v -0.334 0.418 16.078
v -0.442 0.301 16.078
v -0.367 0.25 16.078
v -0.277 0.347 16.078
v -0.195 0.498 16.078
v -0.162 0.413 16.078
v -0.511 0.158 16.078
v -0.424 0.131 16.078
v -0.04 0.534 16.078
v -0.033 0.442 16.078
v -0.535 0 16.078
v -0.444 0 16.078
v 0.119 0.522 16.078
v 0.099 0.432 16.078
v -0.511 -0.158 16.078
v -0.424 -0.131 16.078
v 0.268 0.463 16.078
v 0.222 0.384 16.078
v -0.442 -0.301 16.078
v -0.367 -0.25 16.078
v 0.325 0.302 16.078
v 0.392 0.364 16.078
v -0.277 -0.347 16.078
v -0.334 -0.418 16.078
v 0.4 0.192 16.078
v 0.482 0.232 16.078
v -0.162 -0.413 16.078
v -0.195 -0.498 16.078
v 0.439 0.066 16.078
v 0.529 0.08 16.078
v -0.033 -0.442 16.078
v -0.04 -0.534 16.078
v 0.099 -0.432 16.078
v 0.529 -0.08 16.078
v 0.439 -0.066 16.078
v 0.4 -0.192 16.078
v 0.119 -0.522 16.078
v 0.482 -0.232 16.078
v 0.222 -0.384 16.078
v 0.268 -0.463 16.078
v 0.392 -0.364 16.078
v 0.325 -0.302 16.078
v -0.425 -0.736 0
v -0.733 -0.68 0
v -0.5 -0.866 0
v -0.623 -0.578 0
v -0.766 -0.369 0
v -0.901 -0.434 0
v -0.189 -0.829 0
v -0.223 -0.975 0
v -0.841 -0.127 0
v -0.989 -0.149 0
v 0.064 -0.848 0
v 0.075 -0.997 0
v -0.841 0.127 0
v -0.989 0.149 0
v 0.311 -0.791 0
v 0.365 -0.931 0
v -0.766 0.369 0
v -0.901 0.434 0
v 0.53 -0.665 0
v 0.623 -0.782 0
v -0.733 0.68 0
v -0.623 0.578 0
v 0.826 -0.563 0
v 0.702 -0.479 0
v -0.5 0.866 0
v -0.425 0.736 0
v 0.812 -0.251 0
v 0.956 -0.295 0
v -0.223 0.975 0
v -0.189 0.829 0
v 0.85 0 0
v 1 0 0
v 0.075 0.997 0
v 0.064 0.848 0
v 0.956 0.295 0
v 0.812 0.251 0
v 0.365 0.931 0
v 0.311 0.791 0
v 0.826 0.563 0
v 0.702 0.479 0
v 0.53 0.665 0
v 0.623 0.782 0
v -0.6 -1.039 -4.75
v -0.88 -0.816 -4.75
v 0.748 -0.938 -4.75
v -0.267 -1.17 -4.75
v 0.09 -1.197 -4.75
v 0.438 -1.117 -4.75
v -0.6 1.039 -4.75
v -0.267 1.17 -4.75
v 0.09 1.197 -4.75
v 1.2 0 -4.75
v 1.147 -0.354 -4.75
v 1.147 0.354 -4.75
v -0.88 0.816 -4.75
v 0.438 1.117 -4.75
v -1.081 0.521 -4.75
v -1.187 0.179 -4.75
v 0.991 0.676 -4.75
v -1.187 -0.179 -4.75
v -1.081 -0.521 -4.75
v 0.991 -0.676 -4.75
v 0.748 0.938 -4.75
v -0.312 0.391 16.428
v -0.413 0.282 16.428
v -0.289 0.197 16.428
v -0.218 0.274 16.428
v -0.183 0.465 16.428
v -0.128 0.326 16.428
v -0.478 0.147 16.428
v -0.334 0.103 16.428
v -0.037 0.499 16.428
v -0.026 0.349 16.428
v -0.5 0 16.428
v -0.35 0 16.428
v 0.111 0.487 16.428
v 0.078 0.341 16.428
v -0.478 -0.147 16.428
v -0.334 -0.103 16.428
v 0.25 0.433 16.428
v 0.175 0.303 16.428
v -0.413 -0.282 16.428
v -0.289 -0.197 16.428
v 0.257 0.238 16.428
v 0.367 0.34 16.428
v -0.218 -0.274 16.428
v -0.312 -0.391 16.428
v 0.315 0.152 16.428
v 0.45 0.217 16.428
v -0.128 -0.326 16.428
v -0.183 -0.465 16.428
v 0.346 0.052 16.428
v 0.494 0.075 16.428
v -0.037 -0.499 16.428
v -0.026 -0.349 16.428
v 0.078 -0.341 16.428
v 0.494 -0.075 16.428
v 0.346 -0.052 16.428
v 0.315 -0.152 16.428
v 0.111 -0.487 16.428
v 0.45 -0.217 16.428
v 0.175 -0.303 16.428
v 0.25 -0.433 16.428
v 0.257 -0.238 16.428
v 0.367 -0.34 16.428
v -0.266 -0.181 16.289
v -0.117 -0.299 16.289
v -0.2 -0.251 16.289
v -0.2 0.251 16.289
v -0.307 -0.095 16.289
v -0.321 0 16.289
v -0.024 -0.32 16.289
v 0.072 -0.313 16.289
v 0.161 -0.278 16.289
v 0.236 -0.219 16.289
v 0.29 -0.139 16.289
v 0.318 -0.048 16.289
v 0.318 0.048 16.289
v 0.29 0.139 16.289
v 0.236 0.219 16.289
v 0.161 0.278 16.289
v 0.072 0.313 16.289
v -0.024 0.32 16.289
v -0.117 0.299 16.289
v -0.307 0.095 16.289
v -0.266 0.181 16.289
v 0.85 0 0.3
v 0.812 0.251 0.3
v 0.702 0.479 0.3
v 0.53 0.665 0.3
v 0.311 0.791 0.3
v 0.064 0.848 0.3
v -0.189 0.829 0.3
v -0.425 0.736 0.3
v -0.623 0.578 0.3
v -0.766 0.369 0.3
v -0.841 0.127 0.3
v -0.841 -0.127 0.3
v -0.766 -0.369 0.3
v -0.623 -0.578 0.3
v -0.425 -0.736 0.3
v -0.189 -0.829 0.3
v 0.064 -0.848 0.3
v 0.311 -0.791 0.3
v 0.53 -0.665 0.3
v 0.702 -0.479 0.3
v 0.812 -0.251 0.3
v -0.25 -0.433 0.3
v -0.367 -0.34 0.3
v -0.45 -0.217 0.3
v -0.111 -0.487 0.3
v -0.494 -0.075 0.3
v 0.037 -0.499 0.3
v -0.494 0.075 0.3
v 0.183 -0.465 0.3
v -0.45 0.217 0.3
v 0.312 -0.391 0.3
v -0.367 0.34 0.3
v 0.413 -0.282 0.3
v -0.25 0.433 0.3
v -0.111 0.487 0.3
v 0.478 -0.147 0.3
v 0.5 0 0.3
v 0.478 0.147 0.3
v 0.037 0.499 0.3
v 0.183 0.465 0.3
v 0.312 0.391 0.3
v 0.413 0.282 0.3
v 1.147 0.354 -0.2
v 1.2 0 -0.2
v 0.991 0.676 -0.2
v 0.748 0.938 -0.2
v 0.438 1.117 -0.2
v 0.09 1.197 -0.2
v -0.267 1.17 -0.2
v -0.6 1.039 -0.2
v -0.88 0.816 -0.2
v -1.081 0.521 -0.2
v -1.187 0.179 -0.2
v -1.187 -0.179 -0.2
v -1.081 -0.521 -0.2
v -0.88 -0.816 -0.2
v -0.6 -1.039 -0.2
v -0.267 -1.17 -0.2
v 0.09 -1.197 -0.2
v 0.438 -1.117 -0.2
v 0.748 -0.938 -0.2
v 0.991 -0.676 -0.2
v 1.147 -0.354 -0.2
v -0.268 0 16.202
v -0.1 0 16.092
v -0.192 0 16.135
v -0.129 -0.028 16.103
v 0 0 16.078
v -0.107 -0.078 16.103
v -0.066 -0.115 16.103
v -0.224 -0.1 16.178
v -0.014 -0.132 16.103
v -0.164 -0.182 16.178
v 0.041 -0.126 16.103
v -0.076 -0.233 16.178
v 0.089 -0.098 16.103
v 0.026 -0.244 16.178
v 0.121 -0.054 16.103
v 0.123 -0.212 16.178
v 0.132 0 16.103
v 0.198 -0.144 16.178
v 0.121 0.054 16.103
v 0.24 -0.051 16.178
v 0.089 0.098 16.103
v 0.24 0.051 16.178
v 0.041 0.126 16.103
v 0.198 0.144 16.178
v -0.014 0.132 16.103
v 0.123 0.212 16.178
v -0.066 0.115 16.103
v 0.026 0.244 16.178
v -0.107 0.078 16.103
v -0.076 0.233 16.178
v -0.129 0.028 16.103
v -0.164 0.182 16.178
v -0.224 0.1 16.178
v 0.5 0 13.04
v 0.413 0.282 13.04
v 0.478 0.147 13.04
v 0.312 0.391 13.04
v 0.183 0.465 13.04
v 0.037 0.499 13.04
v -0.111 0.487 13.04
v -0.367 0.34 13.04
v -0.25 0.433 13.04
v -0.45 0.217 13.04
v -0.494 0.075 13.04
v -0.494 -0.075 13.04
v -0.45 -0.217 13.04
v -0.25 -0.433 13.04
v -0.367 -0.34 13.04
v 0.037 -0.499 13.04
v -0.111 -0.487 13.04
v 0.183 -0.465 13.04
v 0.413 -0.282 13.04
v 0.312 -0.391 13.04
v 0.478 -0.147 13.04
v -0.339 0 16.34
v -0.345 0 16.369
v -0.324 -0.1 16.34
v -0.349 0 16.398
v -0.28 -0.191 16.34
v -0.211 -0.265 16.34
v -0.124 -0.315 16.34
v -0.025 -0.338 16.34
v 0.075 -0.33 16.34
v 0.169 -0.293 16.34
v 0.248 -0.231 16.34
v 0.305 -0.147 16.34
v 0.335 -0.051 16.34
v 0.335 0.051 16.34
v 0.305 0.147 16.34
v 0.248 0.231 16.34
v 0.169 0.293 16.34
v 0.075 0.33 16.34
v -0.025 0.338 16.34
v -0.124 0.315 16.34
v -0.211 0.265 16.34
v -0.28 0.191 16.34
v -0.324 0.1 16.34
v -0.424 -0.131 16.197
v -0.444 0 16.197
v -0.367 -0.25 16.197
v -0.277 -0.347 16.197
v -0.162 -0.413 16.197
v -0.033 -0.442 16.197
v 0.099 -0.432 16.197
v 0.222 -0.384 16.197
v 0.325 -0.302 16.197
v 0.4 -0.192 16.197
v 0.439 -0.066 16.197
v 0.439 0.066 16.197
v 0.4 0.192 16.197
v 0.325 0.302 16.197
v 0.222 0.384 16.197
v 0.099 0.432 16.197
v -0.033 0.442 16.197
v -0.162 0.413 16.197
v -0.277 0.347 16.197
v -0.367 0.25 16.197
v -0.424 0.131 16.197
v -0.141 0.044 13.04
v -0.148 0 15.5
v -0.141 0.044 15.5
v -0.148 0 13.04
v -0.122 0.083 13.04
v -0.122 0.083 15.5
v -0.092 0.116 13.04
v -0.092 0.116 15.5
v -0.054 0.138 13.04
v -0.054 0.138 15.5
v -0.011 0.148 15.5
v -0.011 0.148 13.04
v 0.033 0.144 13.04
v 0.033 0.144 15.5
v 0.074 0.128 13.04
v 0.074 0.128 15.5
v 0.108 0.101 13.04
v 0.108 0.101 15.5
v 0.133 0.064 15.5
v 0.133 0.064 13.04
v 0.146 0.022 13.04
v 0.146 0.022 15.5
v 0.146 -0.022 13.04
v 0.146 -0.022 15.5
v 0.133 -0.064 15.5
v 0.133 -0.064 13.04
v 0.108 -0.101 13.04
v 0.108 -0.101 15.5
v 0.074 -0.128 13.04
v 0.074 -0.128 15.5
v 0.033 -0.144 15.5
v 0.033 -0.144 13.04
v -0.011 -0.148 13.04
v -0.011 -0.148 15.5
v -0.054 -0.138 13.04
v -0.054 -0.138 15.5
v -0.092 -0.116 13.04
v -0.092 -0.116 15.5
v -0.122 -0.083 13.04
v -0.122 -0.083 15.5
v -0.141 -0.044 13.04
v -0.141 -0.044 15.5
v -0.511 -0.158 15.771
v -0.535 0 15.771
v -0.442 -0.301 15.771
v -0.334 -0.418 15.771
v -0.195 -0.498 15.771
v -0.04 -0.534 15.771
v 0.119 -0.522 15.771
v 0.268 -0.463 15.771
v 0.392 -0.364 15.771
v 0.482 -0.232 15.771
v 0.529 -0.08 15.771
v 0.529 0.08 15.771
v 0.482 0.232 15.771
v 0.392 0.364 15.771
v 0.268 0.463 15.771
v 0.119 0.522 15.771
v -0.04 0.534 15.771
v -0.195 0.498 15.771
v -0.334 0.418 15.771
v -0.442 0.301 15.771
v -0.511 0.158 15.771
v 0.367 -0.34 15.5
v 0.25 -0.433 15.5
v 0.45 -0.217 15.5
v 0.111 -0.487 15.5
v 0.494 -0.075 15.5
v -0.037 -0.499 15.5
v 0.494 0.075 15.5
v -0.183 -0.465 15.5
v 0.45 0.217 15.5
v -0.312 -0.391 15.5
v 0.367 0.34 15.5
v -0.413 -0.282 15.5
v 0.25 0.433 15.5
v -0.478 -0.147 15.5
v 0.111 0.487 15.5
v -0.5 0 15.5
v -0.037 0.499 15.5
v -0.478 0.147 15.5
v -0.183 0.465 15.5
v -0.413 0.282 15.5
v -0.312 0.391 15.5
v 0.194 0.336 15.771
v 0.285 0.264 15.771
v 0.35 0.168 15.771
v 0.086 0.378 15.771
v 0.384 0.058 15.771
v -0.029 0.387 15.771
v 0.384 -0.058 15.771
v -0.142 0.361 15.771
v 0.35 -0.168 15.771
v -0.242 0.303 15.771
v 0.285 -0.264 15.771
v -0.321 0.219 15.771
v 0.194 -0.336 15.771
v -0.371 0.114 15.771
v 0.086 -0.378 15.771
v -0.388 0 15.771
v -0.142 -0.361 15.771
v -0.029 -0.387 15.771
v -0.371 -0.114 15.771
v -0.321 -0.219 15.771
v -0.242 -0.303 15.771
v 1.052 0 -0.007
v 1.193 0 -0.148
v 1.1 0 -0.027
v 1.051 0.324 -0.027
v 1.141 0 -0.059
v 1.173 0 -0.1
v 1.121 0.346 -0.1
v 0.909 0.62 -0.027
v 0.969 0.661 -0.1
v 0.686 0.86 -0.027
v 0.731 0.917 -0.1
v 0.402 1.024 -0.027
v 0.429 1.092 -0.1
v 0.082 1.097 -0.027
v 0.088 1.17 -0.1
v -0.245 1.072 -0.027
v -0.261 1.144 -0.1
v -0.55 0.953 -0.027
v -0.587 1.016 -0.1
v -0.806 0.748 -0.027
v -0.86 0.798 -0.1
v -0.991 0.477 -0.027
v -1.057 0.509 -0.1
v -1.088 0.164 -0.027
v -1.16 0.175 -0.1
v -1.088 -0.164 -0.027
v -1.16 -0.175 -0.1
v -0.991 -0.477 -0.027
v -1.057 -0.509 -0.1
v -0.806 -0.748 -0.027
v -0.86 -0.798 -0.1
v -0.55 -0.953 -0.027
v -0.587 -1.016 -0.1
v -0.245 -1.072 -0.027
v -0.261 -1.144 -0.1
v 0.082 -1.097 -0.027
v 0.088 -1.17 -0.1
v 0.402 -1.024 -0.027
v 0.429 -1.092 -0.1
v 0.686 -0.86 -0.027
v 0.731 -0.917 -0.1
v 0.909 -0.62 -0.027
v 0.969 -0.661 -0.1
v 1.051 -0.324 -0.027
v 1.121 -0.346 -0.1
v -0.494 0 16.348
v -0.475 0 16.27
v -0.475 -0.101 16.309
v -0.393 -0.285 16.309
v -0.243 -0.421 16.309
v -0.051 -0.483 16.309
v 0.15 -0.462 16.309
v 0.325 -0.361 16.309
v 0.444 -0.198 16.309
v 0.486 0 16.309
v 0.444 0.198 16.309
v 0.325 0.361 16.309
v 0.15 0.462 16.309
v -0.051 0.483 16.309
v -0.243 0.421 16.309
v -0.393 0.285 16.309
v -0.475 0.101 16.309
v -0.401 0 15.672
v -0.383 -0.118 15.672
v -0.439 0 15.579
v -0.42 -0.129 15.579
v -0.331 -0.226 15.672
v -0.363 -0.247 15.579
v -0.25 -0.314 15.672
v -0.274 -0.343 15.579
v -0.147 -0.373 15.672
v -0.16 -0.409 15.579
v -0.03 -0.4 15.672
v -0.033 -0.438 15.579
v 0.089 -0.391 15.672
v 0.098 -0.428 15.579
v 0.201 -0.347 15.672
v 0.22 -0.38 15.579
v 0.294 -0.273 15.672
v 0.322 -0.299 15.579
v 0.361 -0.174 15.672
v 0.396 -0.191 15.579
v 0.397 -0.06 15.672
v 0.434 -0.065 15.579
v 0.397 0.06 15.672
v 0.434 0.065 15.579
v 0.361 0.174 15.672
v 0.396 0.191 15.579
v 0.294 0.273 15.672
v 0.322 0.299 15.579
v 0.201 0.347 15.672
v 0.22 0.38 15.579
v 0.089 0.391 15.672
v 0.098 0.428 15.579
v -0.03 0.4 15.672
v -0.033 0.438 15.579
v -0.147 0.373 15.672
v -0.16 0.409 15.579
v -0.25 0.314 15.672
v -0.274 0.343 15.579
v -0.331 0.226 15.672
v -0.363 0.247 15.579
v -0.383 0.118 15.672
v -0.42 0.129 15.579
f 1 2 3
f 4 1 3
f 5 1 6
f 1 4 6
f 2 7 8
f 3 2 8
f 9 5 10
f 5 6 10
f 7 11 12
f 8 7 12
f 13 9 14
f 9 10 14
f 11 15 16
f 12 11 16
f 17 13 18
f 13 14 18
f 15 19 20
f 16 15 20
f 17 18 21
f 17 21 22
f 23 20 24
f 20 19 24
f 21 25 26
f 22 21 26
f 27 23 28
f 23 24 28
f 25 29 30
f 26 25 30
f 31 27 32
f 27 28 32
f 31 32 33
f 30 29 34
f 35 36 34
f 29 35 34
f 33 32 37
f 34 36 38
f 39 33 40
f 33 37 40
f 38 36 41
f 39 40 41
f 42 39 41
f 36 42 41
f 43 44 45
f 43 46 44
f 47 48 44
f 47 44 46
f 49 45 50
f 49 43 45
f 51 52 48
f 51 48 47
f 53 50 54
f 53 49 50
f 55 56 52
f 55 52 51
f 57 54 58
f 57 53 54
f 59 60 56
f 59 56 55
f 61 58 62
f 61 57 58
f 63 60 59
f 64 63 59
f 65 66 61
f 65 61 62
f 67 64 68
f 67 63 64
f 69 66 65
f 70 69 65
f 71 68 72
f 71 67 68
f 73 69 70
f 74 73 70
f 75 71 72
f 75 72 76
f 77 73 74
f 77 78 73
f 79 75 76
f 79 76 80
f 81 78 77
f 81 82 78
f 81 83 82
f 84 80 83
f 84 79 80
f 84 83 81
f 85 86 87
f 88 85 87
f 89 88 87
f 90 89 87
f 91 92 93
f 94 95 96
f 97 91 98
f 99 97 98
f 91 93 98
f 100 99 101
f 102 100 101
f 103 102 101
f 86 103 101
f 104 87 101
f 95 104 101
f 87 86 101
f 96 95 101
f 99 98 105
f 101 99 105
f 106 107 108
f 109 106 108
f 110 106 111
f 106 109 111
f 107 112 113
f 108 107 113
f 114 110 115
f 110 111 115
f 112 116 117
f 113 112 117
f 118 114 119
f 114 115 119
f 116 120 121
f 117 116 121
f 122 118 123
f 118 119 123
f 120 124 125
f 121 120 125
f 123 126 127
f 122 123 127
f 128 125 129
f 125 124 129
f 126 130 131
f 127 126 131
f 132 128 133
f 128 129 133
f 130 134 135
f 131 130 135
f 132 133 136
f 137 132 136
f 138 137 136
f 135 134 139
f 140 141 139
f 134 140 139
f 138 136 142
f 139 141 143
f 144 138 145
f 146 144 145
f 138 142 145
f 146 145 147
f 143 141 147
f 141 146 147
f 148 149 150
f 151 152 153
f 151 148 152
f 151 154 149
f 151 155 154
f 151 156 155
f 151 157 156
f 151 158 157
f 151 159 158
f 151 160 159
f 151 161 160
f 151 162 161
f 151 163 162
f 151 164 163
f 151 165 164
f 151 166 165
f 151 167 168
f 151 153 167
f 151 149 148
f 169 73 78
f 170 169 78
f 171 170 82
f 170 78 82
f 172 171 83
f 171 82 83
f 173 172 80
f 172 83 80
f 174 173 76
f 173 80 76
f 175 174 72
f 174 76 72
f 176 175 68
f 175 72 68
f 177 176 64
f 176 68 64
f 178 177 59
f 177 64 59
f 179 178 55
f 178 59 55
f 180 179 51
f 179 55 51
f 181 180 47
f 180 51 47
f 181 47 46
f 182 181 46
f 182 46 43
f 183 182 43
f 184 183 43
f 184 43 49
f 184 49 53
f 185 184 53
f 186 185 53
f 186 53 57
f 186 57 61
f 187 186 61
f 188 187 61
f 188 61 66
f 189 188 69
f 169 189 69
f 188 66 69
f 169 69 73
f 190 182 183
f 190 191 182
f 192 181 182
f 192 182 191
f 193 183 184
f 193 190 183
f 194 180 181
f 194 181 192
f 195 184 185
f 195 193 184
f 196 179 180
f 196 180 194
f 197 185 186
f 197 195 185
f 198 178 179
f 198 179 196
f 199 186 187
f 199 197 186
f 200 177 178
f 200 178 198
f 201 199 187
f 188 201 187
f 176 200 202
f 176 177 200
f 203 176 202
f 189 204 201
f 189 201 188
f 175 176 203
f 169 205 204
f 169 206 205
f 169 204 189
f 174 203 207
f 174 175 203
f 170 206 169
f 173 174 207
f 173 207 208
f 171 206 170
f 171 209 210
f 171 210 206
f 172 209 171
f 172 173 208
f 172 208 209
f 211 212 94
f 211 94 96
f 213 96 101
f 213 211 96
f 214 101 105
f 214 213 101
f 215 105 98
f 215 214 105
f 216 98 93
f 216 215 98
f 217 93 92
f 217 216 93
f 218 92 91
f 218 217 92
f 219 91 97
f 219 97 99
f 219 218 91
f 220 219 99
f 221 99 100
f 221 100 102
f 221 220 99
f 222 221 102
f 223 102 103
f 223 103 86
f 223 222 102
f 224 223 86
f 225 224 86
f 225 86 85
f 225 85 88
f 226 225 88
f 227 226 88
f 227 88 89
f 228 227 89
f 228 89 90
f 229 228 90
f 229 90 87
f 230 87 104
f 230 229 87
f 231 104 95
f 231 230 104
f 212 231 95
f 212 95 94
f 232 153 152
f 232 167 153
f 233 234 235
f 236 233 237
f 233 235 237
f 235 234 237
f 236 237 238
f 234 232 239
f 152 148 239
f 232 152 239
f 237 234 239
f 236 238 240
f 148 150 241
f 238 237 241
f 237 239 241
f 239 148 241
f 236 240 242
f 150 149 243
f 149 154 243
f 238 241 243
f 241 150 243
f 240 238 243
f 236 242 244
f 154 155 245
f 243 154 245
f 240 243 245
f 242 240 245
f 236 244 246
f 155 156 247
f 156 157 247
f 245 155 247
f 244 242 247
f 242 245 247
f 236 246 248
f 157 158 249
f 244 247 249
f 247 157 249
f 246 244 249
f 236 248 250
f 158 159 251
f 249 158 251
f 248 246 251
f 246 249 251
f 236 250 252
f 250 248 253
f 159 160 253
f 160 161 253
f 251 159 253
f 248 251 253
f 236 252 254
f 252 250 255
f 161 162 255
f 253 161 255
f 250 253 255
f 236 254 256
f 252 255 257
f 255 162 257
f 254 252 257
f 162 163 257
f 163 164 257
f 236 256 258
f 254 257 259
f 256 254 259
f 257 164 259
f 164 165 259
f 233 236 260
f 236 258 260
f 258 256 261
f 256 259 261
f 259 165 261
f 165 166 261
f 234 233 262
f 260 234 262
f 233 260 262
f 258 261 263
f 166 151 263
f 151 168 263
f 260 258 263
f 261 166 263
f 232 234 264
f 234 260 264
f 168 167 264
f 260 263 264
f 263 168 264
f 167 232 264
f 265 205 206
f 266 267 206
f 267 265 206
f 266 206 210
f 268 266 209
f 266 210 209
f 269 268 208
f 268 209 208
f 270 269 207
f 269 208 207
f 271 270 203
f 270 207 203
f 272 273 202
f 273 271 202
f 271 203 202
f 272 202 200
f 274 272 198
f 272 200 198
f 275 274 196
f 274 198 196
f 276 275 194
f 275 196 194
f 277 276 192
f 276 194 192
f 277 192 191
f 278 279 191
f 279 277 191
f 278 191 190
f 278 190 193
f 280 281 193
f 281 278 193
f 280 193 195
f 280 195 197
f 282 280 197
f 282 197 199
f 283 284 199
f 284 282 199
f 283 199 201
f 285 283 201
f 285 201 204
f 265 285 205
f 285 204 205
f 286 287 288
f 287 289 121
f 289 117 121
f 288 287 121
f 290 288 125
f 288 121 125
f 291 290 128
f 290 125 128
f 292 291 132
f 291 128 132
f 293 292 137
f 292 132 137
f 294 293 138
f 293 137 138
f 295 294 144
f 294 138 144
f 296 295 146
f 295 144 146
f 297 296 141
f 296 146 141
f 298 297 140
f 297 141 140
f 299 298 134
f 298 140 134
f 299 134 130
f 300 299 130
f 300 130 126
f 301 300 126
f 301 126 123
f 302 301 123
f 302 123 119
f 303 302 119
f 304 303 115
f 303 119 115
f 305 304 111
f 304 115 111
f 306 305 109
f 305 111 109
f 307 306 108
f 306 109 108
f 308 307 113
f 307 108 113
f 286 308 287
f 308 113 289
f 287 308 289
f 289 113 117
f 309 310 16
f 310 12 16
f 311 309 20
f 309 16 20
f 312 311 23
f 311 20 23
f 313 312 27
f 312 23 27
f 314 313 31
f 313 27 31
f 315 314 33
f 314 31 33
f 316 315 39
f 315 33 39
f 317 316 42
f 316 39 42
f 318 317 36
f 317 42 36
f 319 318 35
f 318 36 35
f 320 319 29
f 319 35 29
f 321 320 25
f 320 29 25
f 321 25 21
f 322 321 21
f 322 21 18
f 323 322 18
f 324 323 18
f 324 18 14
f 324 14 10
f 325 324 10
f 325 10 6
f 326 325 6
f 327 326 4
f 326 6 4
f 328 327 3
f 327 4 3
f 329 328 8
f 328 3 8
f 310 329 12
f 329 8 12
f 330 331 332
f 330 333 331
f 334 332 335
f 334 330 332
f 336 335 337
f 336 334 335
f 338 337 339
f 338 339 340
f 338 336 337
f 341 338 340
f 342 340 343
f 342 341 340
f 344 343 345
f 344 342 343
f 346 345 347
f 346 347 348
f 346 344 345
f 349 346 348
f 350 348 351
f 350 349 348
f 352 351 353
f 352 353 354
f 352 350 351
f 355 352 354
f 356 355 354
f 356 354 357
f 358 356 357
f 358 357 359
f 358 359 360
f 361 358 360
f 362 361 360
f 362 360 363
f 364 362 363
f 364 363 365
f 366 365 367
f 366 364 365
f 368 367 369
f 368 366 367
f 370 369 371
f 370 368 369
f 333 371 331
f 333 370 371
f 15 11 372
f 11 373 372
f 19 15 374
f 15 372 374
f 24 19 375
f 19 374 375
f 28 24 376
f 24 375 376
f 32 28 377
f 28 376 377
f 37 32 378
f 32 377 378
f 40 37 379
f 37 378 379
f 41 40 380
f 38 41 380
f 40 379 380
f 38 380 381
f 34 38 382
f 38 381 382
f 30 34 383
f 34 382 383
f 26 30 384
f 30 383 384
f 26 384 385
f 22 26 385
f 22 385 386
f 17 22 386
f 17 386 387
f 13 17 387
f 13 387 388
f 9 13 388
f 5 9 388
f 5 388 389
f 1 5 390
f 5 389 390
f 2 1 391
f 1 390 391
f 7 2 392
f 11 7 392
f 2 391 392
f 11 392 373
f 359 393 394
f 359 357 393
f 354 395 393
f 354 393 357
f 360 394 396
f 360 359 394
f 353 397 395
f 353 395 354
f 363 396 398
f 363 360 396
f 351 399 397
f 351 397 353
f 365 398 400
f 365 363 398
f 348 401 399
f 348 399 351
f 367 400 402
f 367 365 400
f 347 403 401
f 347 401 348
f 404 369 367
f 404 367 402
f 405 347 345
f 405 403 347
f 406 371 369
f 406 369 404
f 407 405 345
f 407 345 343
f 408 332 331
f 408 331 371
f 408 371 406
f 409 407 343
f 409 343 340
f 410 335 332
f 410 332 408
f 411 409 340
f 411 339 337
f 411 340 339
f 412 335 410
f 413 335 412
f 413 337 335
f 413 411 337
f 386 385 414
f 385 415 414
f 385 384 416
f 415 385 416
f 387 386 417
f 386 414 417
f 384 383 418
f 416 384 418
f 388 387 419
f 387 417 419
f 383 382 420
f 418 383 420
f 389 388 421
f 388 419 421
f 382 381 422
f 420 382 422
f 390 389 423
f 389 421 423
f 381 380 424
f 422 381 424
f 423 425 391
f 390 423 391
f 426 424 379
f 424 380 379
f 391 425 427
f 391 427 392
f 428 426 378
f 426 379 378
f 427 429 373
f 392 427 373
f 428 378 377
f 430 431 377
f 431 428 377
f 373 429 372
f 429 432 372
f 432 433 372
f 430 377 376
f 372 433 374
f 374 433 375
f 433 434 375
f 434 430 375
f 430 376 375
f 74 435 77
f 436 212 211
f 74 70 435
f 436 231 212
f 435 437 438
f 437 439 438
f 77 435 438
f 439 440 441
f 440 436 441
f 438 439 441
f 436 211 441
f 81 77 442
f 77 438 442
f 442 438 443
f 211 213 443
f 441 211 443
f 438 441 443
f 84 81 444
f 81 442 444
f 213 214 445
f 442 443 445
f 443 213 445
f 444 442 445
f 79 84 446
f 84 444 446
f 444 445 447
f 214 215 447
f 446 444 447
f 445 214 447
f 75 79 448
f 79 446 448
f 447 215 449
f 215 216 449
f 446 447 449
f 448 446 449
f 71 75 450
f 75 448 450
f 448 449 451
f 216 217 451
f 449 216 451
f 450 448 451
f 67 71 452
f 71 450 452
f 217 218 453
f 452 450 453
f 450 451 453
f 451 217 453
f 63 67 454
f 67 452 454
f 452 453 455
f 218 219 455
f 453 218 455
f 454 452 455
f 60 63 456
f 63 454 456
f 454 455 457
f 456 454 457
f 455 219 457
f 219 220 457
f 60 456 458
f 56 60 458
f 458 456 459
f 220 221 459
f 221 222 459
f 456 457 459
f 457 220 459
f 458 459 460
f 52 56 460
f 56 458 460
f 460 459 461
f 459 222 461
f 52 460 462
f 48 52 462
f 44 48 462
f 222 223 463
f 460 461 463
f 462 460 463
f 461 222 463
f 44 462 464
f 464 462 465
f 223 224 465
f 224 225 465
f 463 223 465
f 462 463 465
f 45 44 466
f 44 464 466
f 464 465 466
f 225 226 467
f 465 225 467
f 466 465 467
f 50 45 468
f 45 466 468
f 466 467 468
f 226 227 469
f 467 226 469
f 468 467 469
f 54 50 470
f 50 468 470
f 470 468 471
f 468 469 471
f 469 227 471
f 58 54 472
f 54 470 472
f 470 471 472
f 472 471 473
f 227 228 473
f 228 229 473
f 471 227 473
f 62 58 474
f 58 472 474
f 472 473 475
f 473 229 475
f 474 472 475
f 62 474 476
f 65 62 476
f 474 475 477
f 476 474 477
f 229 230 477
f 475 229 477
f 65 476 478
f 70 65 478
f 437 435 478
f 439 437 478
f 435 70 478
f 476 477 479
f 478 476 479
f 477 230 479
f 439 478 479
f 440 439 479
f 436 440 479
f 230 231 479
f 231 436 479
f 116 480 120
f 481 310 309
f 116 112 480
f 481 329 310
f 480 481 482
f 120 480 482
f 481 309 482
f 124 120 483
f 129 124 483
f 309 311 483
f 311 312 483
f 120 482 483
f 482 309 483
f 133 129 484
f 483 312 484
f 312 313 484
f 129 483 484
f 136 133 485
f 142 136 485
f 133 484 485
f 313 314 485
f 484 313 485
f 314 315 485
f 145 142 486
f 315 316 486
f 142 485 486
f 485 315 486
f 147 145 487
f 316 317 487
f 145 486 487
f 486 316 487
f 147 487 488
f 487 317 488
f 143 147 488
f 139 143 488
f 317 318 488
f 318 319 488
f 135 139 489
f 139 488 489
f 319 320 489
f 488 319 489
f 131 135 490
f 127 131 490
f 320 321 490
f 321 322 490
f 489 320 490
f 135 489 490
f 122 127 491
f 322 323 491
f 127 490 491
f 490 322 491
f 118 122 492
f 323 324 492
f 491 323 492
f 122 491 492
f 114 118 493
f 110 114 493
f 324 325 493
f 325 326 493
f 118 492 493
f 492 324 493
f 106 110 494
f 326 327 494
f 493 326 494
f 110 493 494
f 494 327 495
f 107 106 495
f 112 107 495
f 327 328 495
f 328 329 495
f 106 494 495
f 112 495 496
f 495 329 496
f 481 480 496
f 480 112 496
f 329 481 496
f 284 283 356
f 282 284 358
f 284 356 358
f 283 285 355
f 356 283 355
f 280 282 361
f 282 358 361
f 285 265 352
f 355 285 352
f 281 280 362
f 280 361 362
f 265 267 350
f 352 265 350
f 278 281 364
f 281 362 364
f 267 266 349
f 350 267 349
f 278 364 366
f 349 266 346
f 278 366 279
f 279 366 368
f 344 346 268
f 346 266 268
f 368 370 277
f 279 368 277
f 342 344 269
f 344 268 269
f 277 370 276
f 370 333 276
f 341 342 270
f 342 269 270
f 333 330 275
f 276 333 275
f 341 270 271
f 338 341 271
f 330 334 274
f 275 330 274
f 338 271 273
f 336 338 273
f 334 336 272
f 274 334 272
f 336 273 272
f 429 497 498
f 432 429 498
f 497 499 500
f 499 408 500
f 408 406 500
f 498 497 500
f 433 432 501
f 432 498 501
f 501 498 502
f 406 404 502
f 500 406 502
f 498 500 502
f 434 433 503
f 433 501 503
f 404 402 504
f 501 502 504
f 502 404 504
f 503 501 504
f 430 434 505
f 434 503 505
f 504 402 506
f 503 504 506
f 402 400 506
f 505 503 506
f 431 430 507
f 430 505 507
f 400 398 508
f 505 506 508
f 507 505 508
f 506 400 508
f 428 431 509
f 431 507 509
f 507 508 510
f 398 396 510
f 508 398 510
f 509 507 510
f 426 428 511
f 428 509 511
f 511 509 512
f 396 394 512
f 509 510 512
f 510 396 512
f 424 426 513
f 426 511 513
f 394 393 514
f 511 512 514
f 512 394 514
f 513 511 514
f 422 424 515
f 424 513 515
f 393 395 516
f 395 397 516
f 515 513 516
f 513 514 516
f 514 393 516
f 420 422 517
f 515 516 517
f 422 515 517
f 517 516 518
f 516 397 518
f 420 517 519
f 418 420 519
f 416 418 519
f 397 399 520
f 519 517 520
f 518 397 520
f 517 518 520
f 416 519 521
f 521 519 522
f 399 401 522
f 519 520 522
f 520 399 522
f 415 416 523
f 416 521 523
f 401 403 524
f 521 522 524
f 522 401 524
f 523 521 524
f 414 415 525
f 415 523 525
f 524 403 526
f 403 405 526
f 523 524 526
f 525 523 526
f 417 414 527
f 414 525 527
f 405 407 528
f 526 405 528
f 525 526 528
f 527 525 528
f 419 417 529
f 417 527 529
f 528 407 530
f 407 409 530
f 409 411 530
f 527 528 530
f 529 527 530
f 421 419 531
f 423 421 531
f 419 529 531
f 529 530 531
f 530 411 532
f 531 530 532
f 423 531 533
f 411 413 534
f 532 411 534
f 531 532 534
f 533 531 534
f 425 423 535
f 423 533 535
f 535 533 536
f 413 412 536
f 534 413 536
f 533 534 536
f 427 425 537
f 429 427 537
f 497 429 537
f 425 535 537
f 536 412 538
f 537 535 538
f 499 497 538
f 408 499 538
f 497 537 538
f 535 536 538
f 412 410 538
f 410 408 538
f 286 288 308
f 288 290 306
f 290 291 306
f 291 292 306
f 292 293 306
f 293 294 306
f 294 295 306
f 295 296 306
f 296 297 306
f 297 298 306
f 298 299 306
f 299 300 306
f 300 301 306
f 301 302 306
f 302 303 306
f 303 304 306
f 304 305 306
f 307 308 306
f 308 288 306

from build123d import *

# Parameters (mm, degrees)
SKETCH1_R           = 0.5
BOSS_EXTRUDE2_DEPTH = 15.5
SKETCH1_3_R         = 1.2
BOSS_EXTRUDE3_DEPTH = 4.75
FILLET1_R           = 0.2
SKETCH2_R           = 0.85
BOSS_EXTRUDE4_DEPTH = 0.3
SKETCH4_W           = 0.452177067
SKETCH4_H           = 0.051188015
SKETCH5_W           = 2.336260119
SKETCH5_H           = 2.46


with BuildPart() as part:
    # Sketch1 → Boss-Extrude2 (new body)
    with BuildSketch(Plane.XY):
        Circle(SKETCH1_R)
    extrude(amount=BOSS_EXTRUDE2_DEPTH)



with BuildPart() as body_2:
    # Sketch1<3> → Boss-Extrude3 (new body)
    with BuildSketch(Plane.XY):
        Circle(SKETCH1_3_R)
    extrude(amount=-BOSS_EXTRUDE3_DEPTH)

    # Fillet1
    fillet1_edges = [body_2.edges().sort_by_distance(p)[0] for p in [
        (-1.2, 0, 0),
    ]]
    fillet(fillet1_edges, radius=FILLET1_R)


with BuildPart() as part_1:
    add(part.part)

    add(body_2.part)  # Boss-Extrude4 merges body 2
    # Sketch2 → Boss-Extrude4 (add)
    with BuildSketch(Plane.XY):
        Circle(SKETCH2_R)
    extrude(amount=BOSS_EXTRUDE4_DEPTH)

    # Sketch3 → Revolve1 (revolve)
    with BuildSketch(Plane(origin=(0, 0, 0), x_dir=(1, 0, 0), z_dir=(0, 1, 0))):
        with BuildLine():
            Line((0.5, -15.5), (0, -15.5))
            Line((0, -15.5), (0, -16.0775))
            ThreePointArc((0, -16.0775), (0.247487373, -16.180012627), (0.35, -16.4275))
            Line((0.35, -16.4275), (0.5, -16.4275))
            ThreePointArc((0.5, -16.4275), (0.485692665, -16.308745486), (0.443589461, -16.196787213))
            Line((0.443589461, -16.196787213), (0.443589461, -16.0775))
            Line((0.443589461, -16.0775), (0.535097449, -16.0775))
            Line((0.535097449, -16.0775), (0.535097449, -15.770986484))
            Line((0.535097449, -15.770986484), (0.388145342, -15.770986484))
            ThreePointArc((0.388145342, -15.770986484), (0.417208297, -15.624404477), (0.5, -15.5))
        make_face()
    revolve(axis=Axis((0, 0, 15.5), (0, 0, 1)))

    # Sketch4 → Revolve2 (revolve)
    with BuildSketch(Plane(origin=(0, 0, 0), x_dir=(1, 0, 0), z_dir=(0, 1, 0))):
        with Locations((-0.226088534, -16.314405992)):
            Rectangle(SKETCH4_W, SKETCH4_H)
    revolve(axis=Axis((0, 0, 16.34), (0, 0, -1)))

    # Sketch5 → Cut-Revolve1 (revolve, cut)
    with BuildSketch(Plane(origin=(0, 0, 0), x_dir=(1, 0, 0), z_dir=(0, 1, 0))):
        with Locations((-1.31613006, -14.27)):
            Rectangle(SKETCH5_W, SKETCH5_H)
    revolve(axis=Axis((0, 0, 16.4275), (0, 0, -1)), mode=Mode.SUBTRACT)


solid = part_1.part
